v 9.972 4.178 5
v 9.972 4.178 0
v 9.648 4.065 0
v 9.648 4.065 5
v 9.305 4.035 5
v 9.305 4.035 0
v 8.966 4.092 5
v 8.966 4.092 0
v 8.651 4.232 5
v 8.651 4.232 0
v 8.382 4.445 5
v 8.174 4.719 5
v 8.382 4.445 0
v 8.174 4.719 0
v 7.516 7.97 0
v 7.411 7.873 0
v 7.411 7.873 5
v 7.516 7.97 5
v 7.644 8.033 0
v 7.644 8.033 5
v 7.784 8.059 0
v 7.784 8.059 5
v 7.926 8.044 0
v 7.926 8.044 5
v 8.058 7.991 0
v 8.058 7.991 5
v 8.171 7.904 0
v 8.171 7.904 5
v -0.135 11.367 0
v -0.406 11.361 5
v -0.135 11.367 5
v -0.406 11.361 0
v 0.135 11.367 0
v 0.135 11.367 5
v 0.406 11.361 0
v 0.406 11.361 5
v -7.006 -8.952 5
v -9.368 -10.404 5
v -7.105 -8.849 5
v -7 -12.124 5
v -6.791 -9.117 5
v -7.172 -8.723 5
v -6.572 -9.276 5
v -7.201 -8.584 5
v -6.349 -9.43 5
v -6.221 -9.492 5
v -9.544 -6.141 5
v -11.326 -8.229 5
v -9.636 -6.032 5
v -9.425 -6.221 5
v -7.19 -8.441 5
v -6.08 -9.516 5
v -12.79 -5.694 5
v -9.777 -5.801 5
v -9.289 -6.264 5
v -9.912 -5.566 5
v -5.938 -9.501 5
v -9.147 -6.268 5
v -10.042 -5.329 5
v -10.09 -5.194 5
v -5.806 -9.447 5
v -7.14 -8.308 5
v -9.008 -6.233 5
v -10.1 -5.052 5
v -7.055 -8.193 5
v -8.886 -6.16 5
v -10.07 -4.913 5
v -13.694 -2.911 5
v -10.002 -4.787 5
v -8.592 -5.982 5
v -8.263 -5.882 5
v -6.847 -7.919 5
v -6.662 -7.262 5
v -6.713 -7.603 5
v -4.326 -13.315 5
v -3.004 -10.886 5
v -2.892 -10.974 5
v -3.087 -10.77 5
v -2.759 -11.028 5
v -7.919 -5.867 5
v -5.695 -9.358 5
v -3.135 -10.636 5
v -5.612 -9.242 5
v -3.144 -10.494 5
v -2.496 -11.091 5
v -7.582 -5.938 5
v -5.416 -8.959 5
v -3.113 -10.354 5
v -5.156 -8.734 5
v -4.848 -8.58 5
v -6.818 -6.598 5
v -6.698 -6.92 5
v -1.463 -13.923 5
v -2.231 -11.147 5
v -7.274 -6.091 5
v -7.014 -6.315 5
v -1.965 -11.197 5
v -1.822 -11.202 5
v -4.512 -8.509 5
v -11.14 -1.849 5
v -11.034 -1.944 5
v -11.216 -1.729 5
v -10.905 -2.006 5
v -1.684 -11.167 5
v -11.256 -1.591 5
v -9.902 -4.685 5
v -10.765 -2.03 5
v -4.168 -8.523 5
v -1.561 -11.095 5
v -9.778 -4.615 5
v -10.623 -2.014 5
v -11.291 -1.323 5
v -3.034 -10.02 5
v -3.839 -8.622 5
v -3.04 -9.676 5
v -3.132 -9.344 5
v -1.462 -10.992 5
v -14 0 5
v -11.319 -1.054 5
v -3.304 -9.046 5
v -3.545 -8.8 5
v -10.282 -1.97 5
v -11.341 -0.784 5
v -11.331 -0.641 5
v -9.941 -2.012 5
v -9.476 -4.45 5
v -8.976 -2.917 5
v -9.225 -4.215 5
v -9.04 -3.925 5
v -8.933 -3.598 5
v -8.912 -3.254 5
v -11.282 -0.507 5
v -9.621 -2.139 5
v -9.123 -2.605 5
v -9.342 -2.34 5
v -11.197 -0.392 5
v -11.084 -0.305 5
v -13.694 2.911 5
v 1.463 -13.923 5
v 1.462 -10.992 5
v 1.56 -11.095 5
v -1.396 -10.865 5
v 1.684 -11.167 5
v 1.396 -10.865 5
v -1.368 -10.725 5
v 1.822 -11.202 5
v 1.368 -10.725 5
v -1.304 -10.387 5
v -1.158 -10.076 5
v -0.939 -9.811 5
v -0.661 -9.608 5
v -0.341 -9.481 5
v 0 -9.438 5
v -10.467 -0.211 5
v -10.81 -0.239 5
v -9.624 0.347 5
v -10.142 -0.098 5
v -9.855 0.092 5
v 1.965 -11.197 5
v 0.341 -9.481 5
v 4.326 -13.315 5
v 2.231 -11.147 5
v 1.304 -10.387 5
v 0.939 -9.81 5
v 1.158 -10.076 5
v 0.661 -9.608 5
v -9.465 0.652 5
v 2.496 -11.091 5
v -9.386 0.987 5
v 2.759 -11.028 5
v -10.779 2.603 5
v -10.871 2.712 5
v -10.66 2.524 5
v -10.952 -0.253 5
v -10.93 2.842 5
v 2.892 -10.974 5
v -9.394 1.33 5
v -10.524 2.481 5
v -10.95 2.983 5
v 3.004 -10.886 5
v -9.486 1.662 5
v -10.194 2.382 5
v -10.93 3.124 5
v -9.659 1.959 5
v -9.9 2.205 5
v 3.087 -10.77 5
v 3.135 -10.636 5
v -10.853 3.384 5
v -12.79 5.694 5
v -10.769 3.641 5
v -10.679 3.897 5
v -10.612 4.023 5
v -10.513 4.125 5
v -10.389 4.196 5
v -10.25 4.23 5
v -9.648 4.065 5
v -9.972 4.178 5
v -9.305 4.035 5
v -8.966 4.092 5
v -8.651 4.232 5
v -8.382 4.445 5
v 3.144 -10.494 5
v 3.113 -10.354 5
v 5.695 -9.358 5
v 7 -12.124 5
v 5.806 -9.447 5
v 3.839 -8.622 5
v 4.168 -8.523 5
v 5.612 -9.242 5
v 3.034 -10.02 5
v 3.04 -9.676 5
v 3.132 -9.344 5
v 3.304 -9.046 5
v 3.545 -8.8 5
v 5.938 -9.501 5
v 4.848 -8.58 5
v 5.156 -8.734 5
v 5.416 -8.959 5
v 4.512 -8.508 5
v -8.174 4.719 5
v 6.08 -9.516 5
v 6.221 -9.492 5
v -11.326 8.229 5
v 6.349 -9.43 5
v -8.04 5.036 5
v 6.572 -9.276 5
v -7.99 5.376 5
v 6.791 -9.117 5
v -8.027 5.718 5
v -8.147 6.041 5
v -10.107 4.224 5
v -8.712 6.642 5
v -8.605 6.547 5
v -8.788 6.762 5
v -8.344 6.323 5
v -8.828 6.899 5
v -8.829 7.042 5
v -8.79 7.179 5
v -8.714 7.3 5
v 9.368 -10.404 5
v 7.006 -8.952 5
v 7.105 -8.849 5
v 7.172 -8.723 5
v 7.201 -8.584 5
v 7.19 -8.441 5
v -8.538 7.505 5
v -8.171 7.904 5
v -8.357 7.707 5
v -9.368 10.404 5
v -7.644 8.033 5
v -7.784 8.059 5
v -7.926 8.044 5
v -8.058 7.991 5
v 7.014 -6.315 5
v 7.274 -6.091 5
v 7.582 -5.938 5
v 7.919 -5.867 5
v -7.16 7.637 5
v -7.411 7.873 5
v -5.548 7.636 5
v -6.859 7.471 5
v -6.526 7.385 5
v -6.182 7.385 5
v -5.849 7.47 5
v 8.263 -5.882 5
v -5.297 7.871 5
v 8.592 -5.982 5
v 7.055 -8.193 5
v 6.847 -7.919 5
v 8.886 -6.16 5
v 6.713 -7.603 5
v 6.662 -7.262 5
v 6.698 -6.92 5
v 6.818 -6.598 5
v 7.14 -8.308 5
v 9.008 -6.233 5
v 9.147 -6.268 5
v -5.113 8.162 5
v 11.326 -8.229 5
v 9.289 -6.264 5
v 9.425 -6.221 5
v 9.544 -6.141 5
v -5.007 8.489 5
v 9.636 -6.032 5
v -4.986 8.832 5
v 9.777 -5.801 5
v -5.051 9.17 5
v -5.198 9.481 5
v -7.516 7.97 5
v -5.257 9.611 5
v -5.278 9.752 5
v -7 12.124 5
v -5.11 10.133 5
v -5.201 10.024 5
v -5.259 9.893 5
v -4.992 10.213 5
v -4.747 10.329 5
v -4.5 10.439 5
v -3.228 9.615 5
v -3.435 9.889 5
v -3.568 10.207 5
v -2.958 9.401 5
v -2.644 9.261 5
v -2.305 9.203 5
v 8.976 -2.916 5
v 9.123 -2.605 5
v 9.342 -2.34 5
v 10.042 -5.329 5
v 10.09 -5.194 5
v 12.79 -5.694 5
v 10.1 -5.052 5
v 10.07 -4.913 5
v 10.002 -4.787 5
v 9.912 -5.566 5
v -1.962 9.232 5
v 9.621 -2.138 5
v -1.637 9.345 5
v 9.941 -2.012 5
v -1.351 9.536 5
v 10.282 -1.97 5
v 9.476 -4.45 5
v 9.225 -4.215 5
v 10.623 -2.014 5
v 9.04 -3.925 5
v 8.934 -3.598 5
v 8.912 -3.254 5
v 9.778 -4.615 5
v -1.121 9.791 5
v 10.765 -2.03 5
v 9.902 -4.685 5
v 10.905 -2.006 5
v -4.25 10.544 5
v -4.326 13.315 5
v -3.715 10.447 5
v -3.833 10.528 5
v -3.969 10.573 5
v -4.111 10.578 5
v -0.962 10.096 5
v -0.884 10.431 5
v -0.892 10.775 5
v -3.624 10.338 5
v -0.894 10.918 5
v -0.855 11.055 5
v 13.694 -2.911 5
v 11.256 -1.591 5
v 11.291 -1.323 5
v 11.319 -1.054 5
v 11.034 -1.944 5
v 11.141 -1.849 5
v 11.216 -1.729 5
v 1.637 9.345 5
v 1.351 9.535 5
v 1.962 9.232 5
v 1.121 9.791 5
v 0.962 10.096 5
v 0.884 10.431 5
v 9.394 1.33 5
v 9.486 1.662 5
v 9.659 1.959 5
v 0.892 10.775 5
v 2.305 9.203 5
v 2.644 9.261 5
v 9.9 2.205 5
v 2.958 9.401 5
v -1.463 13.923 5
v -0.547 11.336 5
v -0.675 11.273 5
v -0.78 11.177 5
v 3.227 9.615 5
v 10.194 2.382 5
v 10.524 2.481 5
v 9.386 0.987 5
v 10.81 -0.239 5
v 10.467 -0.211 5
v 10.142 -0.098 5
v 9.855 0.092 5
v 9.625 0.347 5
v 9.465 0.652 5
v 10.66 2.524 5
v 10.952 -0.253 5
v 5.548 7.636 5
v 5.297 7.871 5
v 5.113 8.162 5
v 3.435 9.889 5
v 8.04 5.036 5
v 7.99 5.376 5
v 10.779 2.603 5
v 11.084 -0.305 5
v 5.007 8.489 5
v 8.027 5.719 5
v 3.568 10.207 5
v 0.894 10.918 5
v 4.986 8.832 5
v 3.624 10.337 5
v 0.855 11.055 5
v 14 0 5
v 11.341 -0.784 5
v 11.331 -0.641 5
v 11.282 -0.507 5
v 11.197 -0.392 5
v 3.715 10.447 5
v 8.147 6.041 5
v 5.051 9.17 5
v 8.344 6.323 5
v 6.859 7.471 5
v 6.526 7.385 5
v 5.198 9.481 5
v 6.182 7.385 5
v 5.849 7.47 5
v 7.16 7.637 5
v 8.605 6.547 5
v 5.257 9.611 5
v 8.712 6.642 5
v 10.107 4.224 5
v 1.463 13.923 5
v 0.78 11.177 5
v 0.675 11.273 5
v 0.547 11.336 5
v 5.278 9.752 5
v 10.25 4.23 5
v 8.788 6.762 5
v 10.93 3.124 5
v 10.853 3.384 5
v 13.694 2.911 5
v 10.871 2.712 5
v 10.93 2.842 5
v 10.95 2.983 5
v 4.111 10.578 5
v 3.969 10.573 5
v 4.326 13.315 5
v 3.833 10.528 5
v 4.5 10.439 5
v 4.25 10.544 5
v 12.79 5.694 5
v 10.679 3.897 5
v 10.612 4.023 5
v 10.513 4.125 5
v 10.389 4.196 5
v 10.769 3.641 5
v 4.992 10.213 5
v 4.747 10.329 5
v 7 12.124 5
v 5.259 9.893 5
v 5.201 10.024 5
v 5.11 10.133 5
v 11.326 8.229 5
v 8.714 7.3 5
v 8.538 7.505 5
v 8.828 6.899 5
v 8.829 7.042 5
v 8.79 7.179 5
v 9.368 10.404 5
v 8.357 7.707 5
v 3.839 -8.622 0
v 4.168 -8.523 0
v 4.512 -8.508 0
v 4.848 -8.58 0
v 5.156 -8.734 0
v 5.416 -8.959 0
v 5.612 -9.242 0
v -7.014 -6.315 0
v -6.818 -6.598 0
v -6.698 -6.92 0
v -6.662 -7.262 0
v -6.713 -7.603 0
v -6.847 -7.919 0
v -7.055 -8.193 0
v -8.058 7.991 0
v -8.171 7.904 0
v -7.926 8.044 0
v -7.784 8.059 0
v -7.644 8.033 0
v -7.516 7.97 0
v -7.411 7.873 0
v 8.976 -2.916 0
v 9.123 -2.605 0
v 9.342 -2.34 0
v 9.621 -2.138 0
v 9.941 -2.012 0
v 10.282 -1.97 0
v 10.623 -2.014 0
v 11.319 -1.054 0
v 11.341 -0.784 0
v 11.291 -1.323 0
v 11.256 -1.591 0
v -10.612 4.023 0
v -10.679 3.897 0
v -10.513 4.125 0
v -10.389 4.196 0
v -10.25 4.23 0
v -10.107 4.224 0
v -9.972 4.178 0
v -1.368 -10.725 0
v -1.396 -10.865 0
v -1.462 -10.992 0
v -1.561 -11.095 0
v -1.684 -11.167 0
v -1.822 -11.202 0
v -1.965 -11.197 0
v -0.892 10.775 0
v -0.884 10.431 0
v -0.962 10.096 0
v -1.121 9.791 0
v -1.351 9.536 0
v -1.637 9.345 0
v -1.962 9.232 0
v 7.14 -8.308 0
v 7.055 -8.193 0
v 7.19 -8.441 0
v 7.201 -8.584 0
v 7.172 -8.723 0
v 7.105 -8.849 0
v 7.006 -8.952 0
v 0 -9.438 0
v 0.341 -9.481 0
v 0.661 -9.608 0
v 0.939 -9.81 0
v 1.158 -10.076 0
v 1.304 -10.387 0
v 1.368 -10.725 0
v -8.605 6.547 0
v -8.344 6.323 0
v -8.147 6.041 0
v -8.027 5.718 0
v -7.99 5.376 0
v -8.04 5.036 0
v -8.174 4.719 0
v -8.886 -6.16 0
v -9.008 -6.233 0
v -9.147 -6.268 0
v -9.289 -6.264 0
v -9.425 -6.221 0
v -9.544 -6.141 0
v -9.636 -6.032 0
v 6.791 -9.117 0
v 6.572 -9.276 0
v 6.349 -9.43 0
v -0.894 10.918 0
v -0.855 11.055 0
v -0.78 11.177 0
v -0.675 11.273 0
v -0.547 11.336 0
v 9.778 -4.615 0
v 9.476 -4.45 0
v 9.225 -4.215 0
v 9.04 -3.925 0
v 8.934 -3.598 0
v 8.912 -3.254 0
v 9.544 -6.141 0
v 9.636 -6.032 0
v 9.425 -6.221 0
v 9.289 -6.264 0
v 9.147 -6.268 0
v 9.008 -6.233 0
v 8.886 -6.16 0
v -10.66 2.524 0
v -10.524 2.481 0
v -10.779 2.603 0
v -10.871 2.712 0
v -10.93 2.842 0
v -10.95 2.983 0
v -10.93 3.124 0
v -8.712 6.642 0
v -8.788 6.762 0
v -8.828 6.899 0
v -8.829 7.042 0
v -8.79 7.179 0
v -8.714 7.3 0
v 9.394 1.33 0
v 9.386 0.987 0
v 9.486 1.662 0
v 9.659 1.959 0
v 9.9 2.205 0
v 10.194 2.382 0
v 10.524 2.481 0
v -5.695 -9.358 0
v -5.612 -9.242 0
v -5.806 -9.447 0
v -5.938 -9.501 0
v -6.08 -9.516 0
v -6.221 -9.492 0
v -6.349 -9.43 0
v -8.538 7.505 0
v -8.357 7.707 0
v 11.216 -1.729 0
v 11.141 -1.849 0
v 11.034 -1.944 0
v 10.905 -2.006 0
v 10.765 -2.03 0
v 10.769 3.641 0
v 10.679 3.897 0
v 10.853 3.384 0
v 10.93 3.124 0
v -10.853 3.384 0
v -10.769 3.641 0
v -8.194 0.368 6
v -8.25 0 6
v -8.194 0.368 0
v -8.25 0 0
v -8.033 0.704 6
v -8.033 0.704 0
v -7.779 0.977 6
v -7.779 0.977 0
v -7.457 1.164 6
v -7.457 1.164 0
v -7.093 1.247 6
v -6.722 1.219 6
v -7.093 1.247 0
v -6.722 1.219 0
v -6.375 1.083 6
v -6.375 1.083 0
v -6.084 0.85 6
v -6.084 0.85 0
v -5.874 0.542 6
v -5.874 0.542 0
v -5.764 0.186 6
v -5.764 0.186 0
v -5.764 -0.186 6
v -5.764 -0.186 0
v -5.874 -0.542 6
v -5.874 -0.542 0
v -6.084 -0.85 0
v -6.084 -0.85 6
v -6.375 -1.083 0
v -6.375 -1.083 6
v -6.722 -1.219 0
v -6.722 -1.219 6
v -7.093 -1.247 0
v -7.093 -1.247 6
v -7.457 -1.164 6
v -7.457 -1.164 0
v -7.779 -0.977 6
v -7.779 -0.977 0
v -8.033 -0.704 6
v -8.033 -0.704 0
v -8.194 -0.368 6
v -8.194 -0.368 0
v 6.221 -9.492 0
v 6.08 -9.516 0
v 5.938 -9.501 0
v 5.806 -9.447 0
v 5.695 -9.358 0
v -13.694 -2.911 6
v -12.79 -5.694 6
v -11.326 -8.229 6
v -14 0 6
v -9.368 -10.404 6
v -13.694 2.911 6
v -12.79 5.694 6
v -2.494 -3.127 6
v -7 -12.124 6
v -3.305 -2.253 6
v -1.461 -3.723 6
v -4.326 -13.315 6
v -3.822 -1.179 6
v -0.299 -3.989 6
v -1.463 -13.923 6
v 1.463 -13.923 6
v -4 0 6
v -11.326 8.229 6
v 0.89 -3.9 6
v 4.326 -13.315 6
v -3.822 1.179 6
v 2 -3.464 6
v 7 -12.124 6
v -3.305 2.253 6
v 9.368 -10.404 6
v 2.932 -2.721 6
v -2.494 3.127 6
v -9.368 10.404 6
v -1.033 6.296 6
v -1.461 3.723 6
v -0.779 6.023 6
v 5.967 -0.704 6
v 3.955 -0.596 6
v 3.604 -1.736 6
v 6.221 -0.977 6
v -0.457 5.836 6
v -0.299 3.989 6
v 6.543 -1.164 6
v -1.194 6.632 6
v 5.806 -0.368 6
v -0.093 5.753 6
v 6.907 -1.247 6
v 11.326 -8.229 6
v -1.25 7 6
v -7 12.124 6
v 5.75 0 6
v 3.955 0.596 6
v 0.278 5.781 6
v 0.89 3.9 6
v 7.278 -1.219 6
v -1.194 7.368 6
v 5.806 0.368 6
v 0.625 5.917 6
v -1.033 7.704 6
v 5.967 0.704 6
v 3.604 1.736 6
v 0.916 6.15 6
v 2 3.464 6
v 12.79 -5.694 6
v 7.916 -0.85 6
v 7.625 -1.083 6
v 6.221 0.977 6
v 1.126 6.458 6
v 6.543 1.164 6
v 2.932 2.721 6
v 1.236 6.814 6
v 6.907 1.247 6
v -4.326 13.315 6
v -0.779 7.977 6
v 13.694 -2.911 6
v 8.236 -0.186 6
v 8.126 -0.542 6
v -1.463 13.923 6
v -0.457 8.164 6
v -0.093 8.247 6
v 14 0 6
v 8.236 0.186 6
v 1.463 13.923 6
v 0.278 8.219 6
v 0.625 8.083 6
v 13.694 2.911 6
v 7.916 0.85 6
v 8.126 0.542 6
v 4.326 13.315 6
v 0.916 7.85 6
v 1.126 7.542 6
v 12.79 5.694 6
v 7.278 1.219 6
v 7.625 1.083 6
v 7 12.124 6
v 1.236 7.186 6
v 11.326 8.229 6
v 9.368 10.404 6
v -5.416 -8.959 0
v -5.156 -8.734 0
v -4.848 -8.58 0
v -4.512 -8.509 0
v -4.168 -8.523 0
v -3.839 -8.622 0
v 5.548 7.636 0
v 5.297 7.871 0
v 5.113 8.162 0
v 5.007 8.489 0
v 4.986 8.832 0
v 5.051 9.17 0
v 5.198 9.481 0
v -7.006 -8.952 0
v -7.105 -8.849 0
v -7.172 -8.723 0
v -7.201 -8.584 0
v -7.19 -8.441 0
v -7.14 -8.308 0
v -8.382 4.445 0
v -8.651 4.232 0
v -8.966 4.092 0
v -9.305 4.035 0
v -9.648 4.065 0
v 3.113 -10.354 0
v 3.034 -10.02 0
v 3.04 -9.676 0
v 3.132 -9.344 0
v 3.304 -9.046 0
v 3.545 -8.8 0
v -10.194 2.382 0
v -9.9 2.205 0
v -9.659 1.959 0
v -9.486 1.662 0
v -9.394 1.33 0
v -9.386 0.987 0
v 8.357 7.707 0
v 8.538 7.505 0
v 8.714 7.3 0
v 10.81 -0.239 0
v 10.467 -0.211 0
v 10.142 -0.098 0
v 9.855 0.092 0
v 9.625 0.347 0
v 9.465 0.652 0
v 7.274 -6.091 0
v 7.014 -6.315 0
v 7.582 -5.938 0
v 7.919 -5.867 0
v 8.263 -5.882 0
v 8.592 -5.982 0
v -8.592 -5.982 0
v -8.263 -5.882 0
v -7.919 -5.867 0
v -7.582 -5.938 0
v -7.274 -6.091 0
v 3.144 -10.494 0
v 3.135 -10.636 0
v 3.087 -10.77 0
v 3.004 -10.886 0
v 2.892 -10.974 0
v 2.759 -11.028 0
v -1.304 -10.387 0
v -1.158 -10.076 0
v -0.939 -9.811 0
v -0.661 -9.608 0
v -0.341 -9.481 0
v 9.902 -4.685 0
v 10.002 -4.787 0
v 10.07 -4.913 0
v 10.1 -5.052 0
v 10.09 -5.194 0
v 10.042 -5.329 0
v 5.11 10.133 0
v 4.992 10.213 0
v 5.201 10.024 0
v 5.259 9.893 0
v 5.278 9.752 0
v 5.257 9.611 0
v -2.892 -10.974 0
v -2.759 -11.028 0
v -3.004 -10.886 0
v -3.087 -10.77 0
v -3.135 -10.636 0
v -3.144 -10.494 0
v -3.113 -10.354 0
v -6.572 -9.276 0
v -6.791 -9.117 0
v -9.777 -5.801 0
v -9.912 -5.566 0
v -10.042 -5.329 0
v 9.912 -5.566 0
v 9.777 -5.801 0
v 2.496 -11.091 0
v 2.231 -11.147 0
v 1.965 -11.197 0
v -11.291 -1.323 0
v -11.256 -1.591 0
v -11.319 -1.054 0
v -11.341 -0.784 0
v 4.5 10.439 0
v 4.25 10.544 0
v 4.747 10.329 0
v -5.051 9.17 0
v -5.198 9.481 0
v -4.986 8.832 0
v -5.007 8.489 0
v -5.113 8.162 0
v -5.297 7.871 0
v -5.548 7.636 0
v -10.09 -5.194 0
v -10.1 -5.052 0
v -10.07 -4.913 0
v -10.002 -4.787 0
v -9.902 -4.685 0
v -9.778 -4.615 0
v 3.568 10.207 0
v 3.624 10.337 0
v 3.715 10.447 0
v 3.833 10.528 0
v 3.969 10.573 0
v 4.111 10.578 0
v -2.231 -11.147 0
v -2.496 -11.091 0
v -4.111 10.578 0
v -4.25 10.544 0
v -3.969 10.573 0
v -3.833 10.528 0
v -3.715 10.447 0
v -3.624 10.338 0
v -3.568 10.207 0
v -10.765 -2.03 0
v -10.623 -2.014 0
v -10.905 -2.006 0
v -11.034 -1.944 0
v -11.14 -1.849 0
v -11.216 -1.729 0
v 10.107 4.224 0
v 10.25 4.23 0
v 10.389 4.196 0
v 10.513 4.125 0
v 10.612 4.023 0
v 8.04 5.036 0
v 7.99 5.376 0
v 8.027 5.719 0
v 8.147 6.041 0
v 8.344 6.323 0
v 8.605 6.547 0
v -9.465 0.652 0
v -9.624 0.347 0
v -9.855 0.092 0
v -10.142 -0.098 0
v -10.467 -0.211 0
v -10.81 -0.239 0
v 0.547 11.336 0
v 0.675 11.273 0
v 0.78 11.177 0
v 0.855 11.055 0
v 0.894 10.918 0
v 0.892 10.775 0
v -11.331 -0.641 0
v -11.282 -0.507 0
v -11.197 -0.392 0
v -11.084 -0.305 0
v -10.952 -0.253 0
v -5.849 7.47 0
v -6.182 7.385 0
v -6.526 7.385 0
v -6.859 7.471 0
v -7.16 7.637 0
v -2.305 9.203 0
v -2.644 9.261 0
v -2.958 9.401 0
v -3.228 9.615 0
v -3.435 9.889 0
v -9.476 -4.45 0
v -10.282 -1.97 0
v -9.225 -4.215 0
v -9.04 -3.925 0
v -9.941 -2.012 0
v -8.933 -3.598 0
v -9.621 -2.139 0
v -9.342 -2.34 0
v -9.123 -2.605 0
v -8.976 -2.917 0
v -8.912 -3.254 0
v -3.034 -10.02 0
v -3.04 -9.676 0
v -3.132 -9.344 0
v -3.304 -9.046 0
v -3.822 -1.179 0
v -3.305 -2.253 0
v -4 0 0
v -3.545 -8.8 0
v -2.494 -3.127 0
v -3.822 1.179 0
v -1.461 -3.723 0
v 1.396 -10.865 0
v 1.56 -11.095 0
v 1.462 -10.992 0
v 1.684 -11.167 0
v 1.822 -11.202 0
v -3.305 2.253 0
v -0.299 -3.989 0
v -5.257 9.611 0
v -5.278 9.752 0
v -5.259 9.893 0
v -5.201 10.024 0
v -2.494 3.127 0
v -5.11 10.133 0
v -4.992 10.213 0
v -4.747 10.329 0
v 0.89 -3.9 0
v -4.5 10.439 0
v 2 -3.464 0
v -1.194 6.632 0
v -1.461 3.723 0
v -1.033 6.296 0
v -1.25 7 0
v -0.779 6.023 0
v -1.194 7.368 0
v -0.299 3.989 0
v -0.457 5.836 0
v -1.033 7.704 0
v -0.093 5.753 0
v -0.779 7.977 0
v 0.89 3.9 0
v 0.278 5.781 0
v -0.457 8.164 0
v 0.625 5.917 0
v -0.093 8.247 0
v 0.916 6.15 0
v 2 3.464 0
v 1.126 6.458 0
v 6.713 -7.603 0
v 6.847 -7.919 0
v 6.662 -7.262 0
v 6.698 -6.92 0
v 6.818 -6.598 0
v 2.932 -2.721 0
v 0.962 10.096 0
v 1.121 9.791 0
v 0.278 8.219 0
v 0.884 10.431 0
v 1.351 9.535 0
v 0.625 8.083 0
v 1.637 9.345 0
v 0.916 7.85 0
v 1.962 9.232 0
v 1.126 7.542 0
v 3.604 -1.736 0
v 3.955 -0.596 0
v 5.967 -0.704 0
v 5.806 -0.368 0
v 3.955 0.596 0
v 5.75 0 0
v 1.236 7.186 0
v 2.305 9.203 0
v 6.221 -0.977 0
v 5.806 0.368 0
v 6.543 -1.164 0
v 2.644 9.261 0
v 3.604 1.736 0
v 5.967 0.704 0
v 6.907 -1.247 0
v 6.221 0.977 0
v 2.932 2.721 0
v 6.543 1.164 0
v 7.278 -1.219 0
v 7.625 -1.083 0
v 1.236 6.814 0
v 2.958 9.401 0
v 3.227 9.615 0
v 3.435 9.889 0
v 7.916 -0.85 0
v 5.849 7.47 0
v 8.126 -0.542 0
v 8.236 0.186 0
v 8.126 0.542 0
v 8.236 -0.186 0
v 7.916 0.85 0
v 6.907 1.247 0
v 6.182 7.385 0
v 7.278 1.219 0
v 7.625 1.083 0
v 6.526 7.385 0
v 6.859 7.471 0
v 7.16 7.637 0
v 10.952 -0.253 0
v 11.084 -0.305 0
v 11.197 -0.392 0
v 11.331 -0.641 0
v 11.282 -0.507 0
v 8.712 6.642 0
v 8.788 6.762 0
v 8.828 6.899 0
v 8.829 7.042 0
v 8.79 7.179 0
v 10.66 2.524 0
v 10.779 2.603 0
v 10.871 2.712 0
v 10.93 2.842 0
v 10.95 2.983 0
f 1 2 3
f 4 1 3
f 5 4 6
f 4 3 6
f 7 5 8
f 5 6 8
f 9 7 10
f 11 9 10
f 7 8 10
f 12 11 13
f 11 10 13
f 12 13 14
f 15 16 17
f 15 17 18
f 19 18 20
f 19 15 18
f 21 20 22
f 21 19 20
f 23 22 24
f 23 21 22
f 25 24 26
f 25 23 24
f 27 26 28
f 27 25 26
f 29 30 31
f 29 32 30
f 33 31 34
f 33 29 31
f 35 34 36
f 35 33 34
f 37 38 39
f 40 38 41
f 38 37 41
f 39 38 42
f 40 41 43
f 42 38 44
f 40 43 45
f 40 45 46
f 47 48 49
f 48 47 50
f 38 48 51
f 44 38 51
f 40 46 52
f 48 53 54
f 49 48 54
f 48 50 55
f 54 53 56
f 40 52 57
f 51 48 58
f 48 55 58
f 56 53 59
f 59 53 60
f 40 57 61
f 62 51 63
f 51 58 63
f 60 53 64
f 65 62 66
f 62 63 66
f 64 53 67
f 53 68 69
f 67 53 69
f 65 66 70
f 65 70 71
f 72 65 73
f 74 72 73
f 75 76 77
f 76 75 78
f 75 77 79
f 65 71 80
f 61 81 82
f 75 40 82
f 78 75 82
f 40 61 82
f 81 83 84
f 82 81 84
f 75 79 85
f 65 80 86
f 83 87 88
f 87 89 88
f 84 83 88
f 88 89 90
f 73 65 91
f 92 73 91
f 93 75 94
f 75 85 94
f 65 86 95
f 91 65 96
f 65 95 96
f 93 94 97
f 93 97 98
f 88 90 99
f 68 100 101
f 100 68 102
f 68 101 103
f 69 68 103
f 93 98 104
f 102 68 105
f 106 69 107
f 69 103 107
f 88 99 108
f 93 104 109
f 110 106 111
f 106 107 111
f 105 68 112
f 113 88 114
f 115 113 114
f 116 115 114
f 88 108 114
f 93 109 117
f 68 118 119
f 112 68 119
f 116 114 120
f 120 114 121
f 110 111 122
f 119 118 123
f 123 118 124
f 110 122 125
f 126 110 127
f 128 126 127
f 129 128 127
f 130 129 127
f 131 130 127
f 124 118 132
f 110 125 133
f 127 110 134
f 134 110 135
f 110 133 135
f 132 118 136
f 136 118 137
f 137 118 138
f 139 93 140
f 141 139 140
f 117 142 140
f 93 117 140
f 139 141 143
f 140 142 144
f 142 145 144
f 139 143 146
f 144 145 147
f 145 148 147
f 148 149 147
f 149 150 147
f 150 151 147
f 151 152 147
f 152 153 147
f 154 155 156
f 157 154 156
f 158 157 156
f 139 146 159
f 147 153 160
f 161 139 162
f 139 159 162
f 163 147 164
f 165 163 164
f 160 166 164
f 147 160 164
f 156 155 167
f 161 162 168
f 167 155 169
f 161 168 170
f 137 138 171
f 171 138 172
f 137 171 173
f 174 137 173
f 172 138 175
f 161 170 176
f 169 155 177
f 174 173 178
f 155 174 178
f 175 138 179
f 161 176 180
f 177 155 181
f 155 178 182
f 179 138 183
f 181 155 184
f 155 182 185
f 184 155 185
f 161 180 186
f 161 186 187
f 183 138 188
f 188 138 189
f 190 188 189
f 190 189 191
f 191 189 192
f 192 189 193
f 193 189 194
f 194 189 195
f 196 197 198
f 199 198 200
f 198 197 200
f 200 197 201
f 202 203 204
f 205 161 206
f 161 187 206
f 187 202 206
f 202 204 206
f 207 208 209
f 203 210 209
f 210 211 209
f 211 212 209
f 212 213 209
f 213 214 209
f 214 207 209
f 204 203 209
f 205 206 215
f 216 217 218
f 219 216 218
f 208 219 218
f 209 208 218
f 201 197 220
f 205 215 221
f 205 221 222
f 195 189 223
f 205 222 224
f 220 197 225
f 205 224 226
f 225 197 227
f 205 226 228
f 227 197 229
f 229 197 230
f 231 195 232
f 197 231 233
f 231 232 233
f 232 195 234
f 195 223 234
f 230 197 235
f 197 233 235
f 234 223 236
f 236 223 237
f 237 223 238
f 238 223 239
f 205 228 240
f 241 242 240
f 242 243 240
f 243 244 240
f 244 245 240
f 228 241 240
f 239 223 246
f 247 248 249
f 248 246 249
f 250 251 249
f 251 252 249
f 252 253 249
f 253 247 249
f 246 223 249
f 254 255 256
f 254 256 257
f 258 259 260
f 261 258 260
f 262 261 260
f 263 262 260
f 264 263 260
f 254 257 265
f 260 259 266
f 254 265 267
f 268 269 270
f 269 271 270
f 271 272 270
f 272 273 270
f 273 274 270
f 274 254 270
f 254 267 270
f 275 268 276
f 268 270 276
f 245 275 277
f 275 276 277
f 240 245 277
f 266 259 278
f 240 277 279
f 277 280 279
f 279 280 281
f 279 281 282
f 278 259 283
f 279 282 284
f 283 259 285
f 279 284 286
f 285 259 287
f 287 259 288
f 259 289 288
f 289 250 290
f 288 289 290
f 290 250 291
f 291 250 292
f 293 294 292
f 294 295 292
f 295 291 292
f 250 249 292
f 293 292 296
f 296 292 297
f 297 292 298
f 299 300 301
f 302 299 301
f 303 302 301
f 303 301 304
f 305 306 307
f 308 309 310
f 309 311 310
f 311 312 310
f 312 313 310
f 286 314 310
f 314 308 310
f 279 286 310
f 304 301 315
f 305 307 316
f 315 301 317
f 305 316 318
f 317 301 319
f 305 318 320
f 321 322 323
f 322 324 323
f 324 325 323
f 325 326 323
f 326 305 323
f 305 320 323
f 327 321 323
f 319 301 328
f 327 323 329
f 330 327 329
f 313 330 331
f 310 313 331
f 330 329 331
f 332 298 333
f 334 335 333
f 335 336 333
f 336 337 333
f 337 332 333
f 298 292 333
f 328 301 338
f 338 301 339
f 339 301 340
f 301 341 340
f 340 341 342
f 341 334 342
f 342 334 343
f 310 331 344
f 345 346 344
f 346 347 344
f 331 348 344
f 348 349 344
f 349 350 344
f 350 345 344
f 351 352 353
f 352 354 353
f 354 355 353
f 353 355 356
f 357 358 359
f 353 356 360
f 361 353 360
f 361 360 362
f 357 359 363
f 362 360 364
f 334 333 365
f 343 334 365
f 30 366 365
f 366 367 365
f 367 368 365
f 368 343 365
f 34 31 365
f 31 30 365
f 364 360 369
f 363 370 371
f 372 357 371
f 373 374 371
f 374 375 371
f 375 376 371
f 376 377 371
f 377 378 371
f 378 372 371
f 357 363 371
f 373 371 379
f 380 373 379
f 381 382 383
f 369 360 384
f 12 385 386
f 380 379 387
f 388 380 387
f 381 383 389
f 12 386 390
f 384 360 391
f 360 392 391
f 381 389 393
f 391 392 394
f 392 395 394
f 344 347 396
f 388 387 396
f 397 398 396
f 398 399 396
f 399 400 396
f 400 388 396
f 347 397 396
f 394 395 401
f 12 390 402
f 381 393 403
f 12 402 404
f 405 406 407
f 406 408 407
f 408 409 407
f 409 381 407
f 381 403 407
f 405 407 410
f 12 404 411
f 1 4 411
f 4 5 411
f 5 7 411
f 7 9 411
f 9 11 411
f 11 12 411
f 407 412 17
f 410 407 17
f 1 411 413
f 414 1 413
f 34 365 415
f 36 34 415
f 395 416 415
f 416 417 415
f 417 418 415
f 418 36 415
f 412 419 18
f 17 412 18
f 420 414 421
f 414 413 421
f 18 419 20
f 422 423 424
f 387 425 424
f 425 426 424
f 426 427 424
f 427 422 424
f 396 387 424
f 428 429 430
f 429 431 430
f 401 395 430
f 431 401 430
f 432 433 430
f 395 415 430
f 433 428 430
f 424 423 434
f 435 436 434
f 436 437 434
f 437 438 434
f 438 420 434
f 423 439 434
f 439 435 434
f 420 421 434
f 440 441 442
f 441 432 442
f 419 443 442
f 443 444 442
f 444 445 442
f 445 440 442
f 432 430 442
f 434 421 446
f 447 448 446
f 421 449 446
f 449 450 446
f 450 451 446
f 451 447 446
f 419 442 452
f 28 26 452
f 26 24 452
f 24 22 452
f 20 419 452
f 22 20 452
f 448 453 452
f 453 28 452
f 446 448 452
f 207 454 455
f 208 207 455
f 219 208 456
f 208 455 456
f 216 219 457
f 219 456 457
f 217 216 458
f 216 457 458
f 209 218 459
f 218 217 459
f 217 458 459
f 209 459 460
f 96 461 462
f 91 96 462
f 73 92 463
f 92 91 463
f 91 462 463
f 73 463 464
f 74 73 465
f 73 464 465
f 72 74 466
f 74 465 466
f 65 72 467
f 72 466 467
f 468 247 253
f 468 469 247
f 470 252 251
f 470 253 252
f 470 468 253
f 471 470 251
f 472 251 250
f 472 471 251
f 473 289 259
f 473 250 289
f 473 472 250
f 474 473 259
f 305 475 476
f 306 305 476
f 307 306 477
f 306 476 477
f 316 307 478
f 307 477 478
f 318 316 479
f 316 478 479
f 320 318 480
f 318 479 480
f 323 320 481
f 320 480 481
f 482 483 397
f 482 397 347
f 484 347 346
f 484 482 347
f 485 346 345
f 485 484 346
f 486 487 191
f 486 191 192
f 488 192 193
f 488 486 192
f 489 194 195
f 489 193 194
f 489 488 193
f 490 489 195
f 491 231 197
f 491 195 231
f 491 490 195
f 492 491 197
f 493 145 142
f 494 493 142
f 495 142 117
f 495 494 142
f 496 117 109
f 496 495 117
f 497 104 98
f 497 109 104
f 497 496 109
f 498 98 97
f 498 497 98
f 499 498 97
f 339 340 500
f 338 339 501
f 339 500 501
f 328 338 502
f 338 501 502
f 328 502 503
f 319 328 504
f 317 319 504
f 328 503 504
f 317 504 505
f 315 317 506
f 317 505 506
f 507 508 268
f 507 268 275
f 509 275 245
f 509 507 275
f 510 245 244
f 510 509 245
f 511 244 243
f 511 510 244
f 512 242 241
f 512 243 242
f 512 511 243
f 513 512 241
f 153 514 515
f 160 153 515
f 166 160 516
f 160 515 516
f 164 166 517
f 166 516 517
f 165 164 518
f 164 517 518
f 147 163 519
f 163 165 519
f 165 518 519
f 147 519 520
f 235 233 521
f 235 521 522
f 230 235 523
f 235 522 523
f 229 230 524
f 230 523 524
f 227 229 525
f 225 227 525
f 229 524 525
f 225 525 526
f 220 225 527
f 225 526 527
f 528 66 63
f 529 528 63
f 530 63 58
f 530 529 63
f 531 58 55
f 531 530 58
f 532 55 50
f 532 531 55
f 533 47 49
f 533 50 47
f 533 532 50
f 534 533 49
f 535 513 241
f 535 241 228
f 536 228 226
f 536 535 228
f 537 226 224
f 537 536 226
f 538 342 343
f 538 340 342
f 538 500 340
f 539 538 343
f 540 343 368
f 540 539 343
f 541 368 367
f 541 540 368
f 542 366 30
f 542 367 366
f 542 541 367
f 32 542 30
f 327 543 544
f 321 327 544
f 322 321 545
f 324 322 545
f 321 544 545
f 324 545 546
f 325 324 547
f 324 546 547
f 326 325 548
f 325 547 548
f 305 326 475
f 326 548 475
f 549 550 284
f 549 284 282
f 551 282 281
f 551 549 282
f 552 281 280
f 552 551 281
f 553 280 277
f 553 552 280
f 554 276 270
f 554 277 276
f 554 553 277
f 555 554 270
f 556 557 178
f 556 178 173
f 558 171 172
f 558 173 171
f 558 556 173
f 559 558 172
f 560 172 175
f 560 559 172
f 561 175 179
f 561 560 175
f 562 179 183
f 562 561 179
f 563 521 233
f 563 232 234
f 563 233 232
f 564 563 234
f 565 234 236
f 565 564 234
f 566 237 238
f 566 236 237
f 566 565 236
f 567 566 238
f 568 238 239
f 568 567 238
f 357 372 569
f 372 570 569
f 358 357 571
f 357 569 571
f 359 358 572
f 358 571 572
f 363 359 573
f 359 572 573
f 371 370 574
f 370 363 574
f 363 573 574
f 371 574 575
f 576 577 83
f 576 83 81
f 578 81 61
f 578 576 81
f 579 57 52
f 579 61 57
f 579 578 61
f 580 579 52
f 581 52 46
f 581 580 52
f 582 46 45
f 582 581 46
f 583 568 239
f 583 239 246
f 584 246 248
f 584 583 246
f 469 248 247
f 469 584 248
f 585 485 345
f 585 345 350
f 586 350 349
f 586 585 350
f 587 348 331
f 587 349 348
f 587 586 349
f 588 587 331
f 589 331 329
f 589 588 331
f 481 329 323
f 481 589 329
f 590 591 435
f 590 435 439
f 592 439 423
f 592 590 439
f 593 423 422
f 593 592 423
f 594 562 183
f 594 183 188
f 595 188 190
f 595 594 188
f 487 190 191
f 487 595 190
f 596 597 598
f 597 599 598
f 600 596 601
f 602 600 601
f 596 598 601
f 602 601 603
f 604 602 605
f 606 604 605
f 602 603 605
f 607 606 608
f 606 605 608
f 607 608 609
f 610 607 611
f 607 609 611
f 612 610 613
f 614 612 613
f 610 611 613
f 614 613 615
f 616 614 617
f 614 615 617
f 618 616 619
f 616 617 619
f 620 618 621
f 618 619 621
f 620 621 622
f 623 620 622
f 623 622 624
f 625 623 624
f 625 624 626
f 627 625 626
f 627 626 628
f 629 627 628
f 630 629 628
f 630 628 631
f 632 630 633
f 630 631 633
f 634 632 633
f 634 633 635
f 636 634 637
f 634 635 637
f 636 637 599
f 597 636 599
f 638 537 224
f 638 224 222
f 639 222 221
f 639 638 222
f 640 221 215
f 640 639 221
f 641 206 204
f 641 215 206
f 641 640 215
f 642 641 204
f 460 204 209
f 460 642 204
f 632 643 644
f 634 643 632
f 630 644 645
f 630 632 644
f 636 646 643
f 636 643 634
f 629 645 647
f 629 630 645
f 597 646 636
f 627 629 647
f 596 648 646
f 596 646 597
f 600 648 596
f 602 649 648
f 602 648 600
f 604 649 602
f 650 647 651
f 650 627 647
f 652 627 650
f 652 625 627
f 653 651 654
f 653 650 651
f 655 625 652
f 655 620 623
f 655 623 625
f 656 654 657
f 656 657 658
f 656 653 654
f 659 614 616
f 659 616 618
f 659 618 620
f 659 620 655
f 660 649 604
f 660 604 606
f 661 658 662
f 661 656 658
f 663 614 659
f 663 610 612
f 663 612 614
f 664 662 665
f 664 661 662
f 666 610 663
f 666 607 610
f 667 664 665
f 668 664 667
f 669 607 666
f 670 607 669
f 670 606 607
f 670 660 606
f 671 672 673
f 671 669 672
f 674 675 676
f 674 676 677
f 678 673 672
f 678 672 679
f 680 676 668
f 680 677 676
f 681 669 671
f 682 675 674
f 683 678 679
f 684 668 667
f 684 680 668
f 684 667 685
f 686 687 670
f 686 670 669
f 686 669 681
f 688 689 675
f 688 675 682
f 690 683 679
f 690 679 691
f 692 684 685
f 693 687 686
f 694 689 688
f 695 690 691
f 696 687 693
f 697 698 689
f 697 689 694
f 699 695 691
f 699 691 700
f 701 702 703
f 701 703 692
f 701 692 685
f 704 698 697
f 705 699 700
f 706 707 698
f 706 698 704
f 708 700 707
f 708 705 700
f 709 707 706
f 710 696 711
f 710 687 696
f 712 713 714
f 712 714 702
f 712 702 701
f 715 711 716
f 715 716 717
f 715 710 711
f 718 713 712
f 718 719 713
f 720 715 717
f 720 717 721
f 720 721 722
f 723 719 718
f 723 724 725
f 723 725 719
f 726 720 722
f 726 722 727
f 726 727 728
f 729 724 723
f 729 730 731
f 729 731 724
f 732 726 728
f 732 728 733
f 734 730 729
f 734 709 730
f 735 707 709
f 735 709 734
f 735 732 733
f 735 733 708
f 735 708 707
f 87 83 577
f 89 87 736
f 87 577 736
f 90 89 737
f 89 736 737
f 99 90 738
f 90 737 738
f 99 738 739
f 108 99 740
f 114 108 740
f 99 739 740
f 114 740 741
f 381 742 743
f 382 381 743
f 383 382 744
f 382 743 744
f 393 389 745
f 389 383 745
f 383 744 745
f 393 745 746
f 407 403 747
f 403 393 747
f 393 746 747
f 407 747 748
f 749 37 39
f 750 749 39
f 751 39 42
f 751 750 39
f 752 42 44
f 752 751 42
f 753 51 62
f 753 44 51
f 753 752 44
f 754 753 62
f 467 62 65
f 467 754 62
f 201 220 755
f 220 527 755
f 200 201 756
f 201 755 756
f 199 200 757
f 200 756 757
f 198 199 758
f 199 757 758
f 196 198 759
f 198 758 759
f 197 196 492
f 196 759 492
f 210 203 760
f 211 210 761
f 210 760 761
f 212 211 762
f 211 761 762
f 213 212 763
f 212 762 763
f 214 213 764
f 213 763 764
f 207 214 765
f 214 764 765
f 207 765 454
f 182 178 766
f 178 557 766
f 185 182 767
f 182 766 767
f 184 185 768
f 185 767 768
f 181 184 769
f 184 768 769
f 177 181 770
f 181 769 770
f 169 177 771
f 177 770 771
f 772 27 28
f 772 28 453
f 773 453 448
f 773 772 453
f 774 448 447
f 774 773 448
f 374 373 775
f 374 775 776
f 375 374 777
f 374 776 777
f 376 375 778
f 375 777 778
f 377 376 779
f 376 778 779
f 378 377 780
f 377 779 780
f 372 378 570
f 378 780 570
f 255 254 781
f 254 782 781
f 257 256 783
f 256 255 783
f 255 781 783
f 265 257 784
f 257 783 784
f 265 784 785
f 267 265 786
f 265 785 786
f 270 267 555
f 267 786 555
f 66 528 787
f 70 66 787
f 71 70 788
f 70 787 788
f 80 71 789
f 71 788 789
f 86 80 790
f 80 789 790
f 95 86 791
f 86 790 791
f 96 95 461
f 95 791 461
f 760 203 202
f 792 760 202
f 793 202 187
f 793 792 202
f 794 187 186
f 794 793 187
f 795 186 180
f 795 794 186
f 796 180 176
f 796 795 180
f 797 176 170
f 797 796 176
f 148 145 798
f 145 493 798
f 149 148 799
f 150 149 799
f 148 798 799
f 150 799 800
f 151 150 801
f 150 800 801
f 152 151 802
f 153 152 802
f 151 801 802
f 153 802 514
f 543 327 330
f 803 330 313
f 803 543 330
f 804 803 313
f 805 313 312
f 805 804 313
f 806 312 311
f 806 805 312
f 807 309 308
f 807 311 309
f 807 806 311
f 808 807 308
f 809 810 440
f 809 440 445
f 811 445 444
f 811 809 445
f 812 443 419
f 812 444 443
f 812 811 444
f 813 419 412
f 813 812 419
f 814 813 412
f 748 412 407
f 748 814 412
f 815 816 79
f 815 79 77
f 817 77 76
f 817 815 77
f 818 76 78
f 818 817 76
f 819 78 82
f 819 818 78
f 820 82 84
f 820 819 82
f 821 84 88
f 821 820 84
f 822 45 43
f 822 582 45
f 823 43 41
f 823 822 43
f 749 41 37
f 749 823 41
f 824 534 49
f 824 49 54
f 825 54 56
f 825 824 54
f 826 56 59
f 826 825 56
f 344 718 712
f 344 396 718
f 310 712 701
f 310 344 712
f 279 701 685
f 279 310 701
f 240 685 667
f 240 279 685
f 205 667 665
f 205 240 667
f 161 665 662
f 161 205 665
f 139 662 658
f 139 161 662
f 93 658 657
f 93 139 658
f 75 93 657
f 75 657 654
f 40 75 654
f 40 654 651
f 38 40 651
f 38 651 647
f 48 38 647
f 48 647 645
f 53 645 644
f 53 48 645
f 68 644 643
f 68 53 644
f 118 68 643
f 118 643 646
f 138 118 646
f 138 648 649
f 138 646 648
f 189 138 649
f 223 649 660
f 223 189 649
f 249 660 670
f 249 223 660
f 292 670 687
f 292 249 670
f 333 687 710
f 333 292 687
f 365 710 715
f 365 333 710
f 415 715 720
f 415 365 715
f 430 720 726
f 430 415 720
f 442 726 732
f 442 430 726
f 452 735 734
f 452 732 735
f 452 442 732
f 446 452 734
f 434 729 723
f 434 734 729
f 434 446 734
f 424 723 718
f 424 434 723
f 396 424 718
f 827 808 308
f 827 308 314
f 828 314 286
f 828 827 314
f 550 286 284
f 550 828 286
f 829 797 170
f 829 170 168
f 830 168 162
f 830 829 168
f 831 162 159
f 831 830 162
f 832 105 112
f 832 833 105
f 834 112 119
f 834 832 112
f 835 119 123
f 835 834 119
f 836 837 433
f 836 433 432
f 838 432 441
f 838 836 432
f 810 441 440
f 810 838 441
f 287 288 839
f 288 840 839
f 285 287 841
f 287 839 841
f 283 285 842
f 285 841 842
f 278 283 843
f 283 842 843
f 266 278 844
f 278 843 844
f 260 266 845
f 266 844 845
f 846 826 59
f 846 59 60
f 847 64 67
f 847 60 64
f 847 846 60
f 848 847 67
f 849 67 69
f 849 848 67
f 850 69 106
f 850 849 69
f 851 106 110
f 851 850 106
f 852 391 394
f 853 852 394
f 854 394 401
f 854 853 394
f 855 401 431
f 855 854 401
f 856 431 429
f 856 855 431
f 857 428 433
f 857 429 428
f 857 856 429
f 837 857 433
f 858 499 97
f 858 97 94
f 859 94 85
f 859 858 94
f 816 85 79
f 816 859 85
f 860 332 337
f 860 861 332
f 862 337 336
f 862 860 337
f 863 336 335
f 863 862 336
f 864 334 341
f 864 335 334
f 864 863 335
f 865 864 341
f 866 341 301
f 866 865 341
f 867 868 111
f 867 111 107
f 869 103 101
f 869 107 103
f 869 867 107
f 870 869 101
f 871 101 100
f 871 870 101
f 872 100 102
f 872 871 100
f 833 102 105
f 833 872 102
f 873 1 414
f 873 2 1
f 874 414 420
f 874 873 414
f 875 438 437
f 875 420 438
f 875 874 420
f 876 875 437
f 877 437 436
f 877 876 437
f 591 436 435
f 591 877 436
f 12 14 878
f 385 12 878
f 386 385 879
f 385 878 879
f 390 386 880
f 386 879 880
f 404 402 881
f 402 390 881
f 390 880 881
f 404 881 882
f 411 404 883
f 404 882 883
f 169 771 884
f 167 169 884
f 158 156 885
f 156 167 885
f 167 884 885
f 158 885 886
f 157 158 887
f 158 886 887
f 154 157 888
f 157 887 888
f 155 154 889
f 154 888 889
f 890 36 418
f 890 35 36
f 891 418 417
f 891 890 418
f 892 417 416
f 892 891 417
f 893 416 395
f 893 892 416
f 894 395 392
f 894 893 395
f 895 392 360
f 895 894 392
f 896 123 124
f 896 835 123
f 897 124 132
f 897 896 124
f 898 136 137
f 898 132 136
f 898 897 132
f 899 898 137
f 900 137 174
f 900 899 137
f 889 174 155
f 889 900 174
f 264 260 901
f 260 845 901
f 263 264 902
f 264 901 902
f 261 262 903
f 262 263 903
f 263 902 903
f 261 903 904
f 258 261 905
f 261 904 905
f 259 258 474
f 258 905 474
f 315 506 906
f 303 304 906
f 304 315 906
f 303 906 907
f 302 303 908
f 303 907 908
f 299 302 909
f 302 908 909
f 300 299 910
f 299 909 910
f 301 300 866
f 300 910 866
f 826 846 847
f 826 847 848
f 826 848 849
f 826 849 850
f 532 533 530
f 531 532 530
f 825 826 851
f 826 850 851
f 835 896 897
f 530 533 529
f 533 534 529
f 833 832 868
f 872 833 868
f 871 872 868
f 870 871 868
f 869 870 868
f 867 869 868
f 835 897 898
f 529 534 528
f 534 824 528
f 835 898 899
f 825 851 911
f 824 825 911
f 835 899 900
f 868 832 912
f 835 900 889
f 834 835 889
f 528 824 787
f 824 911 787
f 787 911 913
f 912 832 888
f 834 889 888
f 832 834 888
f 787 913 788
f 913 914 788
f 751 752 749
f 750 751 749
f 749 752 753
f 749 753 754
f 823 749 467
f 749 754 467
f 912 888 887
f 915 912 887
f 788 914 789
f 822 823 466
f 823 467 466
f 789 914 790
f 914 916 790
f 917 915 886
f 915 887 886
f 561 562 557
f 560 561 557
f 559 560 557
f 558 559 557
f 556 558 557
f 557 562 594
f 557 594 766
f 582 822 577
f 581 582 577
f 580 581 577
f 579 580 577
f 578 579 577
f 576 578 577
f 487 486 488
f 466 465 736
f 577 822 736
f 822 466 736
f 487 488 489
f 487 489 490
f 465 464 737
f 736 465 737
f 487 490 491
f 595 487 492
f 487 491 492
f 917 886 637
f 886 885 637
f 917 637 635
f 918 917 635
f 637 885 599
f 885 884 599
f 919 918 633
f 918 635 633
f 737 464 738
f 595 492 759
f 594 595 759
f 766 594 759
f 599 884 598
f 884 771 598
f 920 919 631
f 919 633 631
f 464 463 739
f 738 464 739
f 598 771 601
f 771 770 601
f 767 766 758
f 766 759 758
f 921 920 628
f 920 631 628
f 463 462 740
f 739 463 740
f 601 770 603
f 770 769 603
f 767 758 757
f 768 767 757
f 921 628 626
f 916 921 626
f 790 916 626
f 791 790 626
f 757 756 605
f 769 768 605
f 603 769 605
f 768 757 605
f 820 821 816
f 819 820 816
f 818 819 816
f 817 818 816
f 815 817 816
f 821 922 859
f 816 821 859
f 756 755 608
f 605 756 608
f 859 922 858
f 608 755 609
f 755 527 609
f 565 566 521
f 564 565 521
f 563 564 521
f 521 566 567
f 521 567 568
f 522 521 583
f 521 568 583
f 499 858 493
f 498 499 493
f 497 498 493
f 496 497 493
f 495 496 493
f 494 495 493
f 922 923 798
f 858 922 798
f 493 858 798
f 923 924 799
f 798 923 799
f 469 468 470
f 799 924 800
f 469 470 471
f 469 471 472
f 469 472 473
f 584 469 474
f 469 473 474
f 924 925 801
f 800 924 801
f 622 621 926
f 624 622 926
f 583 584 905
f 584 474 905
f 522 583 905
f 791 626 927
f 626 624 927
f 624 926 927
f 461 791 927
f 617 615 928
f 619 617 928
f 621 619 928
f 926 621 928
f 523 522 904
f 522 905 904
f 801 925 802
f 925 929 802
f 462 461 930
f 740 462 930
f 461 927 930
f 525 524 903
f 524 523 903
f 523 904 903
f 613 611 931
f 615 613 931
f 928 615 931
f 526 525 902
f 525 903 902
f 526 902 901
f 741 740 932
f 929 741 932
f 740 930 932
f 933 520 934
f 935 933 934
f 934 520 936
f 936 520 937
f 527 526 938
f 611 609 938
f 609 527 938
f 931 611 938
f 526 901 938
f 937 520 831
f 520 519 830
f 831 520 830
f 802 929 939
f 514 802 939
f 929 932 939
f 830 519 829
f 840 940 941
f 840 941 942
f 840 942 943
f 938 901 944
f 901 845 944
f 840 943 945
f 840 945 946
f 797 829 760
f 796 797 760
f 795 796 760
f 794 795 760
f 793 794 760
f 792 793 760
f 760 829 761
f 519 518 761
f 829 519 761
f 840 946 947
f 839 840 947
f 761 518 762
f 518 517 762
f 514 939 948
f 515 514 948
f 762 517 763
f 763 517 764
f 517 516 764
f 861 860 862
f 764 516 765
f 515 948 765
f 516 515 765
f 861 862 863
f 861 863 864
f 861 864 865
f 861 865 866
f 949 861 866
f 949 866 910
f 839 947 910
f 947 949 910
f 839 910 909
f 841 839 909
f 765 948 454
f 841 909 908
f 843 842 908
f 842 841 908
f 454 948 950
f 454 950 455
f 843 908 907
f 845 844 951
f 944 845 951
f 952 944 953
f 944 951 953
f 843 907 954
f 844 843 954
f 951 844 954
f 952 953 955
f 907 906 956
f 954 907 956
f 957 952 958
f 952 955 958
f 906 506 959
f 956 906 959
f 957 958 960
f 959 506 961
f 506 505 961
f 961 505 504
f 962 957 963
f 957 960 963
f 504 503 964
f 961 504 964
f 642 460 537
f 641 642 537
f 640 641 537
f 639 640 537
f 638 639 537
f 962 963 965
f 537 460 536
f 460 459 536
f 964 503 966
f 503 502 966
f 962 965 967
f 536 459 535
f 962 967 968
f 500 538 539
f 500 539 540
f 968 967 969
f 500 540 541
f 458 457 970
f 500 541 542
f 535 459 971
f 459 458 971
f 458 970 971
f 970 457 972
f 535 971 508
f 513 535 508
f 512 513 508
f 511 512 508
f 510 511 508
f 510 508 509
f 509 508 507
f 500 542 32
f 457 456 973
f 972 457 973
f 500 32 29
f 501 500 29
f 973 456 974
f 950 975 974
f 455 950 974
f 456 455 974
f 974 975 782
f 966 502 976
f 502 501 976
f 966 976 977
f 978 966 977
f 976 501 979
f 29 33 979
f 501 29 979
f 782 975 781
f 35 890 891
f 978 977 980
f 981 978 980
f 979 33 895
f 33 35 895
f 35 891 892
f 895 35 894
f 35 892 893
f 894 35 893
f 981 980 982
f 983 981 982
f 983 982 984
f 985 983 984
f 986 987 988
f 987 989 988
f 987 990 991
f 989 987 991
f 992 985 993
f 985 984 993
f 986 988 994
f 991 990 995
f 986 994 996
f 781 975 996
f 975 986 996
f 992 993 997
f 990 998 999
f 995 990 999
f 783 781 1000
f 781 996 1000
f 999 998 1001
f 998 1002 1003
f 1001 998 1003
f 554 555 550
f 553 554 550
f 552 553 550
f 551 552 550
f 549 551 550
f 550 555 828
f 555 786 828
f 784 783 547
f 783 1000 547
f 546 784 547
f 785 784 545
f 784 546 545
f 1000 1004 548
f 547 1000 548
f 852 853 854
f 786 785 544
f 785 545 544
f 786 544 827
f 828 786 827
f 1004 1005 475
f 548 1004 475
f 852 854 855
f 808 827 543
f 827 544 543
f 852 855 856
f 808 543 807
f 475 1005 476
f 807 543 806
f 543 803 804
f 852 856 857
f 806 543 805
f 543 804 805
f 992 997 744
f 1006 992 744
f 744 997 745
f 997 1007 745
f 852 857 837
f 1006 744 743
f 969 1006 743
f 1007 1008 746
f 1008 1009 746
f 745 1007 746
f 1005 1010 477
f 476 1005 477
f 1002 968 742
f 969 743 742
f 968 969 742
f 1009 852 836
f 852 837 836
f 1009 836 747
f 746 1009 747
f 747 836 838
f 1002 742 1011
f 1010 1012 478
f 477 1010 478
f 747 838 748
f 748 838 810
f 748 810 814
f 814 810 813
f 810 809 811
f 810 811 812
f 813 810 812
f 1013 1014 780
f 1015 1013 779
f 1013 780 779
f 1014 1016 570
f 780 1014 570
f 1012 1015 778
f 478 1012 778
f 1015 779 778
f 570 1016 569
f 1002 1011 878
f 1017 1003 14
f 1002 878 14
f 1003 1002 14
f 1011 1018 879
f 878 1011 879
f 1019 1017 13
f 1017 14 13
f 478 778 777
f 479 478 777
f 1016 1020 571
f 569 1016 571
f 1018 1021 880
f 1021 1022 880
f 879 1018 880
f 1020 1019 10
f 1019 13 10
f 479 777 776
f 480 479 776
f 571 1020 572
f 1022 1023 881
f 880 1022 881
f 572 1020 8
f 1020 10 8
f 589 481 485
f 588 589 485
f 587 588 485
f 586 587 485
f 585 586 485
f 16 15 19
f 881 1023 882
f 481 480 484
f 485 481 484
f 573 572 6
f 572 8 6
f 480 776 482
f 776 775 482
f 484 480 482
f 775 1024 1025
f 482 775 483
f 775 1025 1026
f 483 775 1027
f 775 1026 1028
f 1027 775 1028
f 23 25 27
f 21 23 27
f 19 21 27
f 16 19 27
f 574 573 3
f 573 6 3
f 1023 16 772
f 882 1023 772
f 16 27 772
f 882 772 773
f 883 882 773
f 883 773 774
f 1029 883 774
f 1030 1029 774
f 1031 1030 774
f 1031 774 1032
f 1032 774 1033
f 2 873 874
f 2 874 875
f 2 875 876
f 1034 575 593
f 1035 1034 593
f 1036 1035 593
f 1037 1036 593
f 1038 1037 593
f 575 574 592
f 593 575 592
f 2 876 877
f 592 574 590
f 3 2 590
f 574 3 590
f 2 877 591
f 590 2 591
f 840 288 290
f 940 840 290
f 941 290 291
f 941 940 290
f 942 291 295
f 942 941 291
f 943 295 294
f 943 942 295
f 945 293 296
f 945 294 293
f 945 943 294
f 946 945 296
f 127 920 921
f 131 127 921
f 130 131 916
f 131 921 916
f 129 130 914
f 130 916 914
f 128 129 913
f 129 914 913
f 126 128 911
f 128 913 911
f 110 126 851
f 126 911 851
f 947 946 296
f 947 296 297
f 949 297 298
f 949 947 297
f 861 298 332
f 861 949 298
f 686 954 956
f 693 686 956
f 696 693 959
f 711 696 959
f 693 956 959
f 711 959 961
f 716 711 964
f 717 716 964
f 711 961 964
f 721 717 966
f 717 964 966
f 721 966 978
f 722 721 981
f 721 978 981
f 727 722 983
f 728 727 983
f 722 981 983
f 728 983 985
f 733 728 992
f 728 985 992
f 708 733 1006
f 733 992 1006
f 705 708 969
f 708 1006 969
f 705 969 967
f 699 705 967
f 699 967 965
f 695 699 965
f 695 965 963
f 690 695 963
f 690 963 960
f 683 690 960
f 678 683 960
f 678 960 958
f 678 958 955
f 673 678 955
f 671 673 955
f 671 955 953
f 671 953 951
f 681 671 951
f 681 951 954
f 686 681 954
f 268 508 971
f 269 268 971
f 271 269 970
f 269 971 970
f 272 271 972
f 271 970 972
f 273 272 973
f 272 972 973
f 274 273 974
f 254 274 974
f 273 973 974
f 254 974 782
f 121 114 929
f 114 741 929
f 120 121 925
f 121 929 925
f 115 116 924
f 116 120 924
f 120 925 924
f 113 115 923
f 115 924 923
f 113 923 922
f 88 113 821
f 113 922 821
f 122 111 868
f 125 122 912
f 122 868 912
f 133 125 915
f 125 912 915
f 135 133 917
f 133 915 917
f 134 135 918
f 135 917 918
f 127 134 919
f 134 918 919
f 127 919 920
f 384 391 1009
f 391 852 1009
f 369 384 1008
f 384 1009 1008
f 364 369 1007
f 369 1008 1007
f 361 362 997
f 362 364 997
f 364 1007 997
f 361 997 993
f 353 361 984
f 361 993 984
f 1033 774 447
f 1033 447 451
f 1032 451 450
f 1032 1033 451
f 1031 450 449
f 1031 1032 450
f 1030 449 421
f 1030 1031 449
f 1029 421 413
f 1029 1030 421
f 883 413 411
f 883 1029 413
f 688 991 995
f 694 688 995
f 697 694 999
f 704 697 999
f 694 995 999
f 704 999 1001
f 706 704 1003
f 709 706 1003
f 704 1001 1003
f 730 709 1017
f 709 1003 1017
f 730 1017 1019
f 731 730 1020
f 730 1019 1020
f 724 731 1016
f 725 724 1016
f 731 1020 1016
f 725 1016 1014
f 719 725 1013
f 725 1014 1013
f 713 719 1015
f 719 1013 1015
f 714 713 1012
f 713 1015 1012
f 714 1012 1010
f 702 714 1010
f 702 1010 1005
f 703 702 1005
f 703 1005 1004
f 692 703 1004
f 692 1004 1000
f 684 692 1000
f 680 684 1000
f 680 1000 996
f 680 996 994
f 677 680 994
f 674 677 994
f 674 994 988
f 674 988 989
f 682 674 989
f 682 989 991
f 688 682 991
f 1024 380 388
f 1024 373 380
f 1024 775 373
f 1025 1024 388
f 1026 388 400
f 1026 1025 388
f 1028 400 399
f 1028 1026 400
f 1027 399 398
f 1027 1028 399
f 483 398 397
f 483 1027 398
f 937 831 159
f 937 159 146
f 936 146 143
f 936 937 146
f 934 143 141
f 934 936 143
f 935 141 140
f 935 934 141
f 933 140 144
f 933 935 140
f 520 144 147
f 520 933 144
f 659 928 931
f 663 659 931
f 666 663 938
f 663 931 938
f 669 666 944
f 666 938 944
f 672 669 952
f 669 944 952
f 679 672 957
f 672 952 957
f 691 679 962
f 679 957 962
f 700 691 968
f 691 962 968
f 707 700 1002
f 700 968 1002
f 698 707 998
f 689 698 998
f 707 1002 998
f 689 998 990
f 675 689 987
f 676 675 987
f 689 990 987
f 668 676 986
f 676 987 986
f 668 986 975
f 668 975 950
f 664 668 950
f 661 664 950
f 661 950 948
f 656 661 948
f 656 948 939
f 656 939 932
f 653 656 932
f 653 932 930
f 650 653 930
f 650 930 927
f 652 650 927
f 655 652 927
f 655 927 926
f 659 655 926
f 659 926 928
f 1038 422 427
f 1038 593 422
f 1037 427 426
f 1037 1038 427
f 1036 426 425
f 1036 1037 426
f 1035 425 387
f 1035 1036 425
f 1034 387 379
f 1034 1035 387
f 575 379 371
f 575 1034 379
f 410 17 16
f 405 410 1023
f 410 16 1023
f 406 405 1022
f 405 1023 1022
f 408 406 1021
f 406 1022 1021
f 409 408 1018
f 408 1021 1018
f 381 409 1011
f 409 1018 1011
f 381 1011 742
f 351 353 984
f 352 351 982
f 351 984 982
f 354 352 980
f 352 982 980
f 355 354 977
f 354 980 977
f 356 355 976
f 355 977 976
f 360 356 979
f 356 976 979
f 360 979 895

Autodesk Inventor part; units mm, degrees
ref_plane "YZ Plane" through (0, 0, 0) normal (1, 0, 0) x (0, 1, 0)
ref_plane "XZ Plane" through (0, 0, 0) normal (0, 1, 0) x (-1, 0, 0)
ref_plane "XY Plane" through (0, 0, 0) normal (0, 0, 1) x (1, 0, 0)
sketch "スケッチ1" plane through (0, 0, 0) normal (0, 0, 1) x (1, 0, 0)
  arc A0 (0.7632, 11.9121) -> (-1.0179, 11.893) centre (0, 0) ccw construction
  arc A1 (0.4062, 11.3607) -> (-0.4062, 11.3607) centre (0, 0) ccw
  arc A2 (9.3048, 1.5803) -> (-9.0567, 2.6555) centre (0, 0) ccw construction
  arc A3 (0.8923, 10.7753) -> (1.9623, 9.2318) centre (2.2471, 10.5718) ccw
  line L0 (1.9623, 9.2318) -> (0, 0)
  arc A4 (-1.9623, 9.2318) -> (-0.8923, 10.7753) centre (-2.2471, 10.5718) ccw
  line L1 (-1.9623, 9.2318) -> (0, 0)
  arc A5 (-0.4062, 11.3607) -> (-0.8923, 10.7753) centre (-0.388, 10.8511) ccw
  arc A6 (0.8923, 10.7753) -> (0.4062, 11.3607) centre (0.388, 10.8511) ccw
  line L2 (0, 0) -> (0, 2.9942) construction
  dimension "d0" = 11.9365
  dimension "d1" = 11.368
  dimension "d2" = 1.93
  dimension "d3" = 0.51
  dimension "d4" = 1.37
  dimension "d5" = 1.37
  dimension "d6" = 24
  dimension "d7" = 12
extrude "押し出し1" add sketch "スケッチ1" along normal blind 5
pattern_circular "円形状パターン1" count 15 over 360 about axis through (0, 0, 0) along (0, 0, 1) of "押し出し1"
sketch "スケッチ2" plane through (0, 0, 5) normal (0, 0, 1) x (1, 0, 0)
  circle A0 centre (0, 0) radius 14
  dimension "d13" = 28
extrude "押し出し2" add sketch "スケッチ2" along normal blind 1
sketch "スケッチ3" plane through (0, 0, 0) normal (0, 0, -1) x (-1, 0, 0)
  circle A0 centre (0, 0) radius 4
  circle A1 centre (0, 7) radius 1.25
  circle A2 centre (-7, 0) radius 1.25
  circle A3 centre (7, 0) radius 1.25
  dimension "d16" = 8
  dimension "d18" = 2.5
  dimension "d19" = 7
  dimension "d20" = 2.5
  dimension "d21" = 2.5
  dimension "d22" = 7
  dimension "d23" = 7
extrude "押し出し3" cut sketch "スケッチ3" against normal through all
properties part number "プーリ_歯数15_2.5mm" material "アセタール樹脂、白"
